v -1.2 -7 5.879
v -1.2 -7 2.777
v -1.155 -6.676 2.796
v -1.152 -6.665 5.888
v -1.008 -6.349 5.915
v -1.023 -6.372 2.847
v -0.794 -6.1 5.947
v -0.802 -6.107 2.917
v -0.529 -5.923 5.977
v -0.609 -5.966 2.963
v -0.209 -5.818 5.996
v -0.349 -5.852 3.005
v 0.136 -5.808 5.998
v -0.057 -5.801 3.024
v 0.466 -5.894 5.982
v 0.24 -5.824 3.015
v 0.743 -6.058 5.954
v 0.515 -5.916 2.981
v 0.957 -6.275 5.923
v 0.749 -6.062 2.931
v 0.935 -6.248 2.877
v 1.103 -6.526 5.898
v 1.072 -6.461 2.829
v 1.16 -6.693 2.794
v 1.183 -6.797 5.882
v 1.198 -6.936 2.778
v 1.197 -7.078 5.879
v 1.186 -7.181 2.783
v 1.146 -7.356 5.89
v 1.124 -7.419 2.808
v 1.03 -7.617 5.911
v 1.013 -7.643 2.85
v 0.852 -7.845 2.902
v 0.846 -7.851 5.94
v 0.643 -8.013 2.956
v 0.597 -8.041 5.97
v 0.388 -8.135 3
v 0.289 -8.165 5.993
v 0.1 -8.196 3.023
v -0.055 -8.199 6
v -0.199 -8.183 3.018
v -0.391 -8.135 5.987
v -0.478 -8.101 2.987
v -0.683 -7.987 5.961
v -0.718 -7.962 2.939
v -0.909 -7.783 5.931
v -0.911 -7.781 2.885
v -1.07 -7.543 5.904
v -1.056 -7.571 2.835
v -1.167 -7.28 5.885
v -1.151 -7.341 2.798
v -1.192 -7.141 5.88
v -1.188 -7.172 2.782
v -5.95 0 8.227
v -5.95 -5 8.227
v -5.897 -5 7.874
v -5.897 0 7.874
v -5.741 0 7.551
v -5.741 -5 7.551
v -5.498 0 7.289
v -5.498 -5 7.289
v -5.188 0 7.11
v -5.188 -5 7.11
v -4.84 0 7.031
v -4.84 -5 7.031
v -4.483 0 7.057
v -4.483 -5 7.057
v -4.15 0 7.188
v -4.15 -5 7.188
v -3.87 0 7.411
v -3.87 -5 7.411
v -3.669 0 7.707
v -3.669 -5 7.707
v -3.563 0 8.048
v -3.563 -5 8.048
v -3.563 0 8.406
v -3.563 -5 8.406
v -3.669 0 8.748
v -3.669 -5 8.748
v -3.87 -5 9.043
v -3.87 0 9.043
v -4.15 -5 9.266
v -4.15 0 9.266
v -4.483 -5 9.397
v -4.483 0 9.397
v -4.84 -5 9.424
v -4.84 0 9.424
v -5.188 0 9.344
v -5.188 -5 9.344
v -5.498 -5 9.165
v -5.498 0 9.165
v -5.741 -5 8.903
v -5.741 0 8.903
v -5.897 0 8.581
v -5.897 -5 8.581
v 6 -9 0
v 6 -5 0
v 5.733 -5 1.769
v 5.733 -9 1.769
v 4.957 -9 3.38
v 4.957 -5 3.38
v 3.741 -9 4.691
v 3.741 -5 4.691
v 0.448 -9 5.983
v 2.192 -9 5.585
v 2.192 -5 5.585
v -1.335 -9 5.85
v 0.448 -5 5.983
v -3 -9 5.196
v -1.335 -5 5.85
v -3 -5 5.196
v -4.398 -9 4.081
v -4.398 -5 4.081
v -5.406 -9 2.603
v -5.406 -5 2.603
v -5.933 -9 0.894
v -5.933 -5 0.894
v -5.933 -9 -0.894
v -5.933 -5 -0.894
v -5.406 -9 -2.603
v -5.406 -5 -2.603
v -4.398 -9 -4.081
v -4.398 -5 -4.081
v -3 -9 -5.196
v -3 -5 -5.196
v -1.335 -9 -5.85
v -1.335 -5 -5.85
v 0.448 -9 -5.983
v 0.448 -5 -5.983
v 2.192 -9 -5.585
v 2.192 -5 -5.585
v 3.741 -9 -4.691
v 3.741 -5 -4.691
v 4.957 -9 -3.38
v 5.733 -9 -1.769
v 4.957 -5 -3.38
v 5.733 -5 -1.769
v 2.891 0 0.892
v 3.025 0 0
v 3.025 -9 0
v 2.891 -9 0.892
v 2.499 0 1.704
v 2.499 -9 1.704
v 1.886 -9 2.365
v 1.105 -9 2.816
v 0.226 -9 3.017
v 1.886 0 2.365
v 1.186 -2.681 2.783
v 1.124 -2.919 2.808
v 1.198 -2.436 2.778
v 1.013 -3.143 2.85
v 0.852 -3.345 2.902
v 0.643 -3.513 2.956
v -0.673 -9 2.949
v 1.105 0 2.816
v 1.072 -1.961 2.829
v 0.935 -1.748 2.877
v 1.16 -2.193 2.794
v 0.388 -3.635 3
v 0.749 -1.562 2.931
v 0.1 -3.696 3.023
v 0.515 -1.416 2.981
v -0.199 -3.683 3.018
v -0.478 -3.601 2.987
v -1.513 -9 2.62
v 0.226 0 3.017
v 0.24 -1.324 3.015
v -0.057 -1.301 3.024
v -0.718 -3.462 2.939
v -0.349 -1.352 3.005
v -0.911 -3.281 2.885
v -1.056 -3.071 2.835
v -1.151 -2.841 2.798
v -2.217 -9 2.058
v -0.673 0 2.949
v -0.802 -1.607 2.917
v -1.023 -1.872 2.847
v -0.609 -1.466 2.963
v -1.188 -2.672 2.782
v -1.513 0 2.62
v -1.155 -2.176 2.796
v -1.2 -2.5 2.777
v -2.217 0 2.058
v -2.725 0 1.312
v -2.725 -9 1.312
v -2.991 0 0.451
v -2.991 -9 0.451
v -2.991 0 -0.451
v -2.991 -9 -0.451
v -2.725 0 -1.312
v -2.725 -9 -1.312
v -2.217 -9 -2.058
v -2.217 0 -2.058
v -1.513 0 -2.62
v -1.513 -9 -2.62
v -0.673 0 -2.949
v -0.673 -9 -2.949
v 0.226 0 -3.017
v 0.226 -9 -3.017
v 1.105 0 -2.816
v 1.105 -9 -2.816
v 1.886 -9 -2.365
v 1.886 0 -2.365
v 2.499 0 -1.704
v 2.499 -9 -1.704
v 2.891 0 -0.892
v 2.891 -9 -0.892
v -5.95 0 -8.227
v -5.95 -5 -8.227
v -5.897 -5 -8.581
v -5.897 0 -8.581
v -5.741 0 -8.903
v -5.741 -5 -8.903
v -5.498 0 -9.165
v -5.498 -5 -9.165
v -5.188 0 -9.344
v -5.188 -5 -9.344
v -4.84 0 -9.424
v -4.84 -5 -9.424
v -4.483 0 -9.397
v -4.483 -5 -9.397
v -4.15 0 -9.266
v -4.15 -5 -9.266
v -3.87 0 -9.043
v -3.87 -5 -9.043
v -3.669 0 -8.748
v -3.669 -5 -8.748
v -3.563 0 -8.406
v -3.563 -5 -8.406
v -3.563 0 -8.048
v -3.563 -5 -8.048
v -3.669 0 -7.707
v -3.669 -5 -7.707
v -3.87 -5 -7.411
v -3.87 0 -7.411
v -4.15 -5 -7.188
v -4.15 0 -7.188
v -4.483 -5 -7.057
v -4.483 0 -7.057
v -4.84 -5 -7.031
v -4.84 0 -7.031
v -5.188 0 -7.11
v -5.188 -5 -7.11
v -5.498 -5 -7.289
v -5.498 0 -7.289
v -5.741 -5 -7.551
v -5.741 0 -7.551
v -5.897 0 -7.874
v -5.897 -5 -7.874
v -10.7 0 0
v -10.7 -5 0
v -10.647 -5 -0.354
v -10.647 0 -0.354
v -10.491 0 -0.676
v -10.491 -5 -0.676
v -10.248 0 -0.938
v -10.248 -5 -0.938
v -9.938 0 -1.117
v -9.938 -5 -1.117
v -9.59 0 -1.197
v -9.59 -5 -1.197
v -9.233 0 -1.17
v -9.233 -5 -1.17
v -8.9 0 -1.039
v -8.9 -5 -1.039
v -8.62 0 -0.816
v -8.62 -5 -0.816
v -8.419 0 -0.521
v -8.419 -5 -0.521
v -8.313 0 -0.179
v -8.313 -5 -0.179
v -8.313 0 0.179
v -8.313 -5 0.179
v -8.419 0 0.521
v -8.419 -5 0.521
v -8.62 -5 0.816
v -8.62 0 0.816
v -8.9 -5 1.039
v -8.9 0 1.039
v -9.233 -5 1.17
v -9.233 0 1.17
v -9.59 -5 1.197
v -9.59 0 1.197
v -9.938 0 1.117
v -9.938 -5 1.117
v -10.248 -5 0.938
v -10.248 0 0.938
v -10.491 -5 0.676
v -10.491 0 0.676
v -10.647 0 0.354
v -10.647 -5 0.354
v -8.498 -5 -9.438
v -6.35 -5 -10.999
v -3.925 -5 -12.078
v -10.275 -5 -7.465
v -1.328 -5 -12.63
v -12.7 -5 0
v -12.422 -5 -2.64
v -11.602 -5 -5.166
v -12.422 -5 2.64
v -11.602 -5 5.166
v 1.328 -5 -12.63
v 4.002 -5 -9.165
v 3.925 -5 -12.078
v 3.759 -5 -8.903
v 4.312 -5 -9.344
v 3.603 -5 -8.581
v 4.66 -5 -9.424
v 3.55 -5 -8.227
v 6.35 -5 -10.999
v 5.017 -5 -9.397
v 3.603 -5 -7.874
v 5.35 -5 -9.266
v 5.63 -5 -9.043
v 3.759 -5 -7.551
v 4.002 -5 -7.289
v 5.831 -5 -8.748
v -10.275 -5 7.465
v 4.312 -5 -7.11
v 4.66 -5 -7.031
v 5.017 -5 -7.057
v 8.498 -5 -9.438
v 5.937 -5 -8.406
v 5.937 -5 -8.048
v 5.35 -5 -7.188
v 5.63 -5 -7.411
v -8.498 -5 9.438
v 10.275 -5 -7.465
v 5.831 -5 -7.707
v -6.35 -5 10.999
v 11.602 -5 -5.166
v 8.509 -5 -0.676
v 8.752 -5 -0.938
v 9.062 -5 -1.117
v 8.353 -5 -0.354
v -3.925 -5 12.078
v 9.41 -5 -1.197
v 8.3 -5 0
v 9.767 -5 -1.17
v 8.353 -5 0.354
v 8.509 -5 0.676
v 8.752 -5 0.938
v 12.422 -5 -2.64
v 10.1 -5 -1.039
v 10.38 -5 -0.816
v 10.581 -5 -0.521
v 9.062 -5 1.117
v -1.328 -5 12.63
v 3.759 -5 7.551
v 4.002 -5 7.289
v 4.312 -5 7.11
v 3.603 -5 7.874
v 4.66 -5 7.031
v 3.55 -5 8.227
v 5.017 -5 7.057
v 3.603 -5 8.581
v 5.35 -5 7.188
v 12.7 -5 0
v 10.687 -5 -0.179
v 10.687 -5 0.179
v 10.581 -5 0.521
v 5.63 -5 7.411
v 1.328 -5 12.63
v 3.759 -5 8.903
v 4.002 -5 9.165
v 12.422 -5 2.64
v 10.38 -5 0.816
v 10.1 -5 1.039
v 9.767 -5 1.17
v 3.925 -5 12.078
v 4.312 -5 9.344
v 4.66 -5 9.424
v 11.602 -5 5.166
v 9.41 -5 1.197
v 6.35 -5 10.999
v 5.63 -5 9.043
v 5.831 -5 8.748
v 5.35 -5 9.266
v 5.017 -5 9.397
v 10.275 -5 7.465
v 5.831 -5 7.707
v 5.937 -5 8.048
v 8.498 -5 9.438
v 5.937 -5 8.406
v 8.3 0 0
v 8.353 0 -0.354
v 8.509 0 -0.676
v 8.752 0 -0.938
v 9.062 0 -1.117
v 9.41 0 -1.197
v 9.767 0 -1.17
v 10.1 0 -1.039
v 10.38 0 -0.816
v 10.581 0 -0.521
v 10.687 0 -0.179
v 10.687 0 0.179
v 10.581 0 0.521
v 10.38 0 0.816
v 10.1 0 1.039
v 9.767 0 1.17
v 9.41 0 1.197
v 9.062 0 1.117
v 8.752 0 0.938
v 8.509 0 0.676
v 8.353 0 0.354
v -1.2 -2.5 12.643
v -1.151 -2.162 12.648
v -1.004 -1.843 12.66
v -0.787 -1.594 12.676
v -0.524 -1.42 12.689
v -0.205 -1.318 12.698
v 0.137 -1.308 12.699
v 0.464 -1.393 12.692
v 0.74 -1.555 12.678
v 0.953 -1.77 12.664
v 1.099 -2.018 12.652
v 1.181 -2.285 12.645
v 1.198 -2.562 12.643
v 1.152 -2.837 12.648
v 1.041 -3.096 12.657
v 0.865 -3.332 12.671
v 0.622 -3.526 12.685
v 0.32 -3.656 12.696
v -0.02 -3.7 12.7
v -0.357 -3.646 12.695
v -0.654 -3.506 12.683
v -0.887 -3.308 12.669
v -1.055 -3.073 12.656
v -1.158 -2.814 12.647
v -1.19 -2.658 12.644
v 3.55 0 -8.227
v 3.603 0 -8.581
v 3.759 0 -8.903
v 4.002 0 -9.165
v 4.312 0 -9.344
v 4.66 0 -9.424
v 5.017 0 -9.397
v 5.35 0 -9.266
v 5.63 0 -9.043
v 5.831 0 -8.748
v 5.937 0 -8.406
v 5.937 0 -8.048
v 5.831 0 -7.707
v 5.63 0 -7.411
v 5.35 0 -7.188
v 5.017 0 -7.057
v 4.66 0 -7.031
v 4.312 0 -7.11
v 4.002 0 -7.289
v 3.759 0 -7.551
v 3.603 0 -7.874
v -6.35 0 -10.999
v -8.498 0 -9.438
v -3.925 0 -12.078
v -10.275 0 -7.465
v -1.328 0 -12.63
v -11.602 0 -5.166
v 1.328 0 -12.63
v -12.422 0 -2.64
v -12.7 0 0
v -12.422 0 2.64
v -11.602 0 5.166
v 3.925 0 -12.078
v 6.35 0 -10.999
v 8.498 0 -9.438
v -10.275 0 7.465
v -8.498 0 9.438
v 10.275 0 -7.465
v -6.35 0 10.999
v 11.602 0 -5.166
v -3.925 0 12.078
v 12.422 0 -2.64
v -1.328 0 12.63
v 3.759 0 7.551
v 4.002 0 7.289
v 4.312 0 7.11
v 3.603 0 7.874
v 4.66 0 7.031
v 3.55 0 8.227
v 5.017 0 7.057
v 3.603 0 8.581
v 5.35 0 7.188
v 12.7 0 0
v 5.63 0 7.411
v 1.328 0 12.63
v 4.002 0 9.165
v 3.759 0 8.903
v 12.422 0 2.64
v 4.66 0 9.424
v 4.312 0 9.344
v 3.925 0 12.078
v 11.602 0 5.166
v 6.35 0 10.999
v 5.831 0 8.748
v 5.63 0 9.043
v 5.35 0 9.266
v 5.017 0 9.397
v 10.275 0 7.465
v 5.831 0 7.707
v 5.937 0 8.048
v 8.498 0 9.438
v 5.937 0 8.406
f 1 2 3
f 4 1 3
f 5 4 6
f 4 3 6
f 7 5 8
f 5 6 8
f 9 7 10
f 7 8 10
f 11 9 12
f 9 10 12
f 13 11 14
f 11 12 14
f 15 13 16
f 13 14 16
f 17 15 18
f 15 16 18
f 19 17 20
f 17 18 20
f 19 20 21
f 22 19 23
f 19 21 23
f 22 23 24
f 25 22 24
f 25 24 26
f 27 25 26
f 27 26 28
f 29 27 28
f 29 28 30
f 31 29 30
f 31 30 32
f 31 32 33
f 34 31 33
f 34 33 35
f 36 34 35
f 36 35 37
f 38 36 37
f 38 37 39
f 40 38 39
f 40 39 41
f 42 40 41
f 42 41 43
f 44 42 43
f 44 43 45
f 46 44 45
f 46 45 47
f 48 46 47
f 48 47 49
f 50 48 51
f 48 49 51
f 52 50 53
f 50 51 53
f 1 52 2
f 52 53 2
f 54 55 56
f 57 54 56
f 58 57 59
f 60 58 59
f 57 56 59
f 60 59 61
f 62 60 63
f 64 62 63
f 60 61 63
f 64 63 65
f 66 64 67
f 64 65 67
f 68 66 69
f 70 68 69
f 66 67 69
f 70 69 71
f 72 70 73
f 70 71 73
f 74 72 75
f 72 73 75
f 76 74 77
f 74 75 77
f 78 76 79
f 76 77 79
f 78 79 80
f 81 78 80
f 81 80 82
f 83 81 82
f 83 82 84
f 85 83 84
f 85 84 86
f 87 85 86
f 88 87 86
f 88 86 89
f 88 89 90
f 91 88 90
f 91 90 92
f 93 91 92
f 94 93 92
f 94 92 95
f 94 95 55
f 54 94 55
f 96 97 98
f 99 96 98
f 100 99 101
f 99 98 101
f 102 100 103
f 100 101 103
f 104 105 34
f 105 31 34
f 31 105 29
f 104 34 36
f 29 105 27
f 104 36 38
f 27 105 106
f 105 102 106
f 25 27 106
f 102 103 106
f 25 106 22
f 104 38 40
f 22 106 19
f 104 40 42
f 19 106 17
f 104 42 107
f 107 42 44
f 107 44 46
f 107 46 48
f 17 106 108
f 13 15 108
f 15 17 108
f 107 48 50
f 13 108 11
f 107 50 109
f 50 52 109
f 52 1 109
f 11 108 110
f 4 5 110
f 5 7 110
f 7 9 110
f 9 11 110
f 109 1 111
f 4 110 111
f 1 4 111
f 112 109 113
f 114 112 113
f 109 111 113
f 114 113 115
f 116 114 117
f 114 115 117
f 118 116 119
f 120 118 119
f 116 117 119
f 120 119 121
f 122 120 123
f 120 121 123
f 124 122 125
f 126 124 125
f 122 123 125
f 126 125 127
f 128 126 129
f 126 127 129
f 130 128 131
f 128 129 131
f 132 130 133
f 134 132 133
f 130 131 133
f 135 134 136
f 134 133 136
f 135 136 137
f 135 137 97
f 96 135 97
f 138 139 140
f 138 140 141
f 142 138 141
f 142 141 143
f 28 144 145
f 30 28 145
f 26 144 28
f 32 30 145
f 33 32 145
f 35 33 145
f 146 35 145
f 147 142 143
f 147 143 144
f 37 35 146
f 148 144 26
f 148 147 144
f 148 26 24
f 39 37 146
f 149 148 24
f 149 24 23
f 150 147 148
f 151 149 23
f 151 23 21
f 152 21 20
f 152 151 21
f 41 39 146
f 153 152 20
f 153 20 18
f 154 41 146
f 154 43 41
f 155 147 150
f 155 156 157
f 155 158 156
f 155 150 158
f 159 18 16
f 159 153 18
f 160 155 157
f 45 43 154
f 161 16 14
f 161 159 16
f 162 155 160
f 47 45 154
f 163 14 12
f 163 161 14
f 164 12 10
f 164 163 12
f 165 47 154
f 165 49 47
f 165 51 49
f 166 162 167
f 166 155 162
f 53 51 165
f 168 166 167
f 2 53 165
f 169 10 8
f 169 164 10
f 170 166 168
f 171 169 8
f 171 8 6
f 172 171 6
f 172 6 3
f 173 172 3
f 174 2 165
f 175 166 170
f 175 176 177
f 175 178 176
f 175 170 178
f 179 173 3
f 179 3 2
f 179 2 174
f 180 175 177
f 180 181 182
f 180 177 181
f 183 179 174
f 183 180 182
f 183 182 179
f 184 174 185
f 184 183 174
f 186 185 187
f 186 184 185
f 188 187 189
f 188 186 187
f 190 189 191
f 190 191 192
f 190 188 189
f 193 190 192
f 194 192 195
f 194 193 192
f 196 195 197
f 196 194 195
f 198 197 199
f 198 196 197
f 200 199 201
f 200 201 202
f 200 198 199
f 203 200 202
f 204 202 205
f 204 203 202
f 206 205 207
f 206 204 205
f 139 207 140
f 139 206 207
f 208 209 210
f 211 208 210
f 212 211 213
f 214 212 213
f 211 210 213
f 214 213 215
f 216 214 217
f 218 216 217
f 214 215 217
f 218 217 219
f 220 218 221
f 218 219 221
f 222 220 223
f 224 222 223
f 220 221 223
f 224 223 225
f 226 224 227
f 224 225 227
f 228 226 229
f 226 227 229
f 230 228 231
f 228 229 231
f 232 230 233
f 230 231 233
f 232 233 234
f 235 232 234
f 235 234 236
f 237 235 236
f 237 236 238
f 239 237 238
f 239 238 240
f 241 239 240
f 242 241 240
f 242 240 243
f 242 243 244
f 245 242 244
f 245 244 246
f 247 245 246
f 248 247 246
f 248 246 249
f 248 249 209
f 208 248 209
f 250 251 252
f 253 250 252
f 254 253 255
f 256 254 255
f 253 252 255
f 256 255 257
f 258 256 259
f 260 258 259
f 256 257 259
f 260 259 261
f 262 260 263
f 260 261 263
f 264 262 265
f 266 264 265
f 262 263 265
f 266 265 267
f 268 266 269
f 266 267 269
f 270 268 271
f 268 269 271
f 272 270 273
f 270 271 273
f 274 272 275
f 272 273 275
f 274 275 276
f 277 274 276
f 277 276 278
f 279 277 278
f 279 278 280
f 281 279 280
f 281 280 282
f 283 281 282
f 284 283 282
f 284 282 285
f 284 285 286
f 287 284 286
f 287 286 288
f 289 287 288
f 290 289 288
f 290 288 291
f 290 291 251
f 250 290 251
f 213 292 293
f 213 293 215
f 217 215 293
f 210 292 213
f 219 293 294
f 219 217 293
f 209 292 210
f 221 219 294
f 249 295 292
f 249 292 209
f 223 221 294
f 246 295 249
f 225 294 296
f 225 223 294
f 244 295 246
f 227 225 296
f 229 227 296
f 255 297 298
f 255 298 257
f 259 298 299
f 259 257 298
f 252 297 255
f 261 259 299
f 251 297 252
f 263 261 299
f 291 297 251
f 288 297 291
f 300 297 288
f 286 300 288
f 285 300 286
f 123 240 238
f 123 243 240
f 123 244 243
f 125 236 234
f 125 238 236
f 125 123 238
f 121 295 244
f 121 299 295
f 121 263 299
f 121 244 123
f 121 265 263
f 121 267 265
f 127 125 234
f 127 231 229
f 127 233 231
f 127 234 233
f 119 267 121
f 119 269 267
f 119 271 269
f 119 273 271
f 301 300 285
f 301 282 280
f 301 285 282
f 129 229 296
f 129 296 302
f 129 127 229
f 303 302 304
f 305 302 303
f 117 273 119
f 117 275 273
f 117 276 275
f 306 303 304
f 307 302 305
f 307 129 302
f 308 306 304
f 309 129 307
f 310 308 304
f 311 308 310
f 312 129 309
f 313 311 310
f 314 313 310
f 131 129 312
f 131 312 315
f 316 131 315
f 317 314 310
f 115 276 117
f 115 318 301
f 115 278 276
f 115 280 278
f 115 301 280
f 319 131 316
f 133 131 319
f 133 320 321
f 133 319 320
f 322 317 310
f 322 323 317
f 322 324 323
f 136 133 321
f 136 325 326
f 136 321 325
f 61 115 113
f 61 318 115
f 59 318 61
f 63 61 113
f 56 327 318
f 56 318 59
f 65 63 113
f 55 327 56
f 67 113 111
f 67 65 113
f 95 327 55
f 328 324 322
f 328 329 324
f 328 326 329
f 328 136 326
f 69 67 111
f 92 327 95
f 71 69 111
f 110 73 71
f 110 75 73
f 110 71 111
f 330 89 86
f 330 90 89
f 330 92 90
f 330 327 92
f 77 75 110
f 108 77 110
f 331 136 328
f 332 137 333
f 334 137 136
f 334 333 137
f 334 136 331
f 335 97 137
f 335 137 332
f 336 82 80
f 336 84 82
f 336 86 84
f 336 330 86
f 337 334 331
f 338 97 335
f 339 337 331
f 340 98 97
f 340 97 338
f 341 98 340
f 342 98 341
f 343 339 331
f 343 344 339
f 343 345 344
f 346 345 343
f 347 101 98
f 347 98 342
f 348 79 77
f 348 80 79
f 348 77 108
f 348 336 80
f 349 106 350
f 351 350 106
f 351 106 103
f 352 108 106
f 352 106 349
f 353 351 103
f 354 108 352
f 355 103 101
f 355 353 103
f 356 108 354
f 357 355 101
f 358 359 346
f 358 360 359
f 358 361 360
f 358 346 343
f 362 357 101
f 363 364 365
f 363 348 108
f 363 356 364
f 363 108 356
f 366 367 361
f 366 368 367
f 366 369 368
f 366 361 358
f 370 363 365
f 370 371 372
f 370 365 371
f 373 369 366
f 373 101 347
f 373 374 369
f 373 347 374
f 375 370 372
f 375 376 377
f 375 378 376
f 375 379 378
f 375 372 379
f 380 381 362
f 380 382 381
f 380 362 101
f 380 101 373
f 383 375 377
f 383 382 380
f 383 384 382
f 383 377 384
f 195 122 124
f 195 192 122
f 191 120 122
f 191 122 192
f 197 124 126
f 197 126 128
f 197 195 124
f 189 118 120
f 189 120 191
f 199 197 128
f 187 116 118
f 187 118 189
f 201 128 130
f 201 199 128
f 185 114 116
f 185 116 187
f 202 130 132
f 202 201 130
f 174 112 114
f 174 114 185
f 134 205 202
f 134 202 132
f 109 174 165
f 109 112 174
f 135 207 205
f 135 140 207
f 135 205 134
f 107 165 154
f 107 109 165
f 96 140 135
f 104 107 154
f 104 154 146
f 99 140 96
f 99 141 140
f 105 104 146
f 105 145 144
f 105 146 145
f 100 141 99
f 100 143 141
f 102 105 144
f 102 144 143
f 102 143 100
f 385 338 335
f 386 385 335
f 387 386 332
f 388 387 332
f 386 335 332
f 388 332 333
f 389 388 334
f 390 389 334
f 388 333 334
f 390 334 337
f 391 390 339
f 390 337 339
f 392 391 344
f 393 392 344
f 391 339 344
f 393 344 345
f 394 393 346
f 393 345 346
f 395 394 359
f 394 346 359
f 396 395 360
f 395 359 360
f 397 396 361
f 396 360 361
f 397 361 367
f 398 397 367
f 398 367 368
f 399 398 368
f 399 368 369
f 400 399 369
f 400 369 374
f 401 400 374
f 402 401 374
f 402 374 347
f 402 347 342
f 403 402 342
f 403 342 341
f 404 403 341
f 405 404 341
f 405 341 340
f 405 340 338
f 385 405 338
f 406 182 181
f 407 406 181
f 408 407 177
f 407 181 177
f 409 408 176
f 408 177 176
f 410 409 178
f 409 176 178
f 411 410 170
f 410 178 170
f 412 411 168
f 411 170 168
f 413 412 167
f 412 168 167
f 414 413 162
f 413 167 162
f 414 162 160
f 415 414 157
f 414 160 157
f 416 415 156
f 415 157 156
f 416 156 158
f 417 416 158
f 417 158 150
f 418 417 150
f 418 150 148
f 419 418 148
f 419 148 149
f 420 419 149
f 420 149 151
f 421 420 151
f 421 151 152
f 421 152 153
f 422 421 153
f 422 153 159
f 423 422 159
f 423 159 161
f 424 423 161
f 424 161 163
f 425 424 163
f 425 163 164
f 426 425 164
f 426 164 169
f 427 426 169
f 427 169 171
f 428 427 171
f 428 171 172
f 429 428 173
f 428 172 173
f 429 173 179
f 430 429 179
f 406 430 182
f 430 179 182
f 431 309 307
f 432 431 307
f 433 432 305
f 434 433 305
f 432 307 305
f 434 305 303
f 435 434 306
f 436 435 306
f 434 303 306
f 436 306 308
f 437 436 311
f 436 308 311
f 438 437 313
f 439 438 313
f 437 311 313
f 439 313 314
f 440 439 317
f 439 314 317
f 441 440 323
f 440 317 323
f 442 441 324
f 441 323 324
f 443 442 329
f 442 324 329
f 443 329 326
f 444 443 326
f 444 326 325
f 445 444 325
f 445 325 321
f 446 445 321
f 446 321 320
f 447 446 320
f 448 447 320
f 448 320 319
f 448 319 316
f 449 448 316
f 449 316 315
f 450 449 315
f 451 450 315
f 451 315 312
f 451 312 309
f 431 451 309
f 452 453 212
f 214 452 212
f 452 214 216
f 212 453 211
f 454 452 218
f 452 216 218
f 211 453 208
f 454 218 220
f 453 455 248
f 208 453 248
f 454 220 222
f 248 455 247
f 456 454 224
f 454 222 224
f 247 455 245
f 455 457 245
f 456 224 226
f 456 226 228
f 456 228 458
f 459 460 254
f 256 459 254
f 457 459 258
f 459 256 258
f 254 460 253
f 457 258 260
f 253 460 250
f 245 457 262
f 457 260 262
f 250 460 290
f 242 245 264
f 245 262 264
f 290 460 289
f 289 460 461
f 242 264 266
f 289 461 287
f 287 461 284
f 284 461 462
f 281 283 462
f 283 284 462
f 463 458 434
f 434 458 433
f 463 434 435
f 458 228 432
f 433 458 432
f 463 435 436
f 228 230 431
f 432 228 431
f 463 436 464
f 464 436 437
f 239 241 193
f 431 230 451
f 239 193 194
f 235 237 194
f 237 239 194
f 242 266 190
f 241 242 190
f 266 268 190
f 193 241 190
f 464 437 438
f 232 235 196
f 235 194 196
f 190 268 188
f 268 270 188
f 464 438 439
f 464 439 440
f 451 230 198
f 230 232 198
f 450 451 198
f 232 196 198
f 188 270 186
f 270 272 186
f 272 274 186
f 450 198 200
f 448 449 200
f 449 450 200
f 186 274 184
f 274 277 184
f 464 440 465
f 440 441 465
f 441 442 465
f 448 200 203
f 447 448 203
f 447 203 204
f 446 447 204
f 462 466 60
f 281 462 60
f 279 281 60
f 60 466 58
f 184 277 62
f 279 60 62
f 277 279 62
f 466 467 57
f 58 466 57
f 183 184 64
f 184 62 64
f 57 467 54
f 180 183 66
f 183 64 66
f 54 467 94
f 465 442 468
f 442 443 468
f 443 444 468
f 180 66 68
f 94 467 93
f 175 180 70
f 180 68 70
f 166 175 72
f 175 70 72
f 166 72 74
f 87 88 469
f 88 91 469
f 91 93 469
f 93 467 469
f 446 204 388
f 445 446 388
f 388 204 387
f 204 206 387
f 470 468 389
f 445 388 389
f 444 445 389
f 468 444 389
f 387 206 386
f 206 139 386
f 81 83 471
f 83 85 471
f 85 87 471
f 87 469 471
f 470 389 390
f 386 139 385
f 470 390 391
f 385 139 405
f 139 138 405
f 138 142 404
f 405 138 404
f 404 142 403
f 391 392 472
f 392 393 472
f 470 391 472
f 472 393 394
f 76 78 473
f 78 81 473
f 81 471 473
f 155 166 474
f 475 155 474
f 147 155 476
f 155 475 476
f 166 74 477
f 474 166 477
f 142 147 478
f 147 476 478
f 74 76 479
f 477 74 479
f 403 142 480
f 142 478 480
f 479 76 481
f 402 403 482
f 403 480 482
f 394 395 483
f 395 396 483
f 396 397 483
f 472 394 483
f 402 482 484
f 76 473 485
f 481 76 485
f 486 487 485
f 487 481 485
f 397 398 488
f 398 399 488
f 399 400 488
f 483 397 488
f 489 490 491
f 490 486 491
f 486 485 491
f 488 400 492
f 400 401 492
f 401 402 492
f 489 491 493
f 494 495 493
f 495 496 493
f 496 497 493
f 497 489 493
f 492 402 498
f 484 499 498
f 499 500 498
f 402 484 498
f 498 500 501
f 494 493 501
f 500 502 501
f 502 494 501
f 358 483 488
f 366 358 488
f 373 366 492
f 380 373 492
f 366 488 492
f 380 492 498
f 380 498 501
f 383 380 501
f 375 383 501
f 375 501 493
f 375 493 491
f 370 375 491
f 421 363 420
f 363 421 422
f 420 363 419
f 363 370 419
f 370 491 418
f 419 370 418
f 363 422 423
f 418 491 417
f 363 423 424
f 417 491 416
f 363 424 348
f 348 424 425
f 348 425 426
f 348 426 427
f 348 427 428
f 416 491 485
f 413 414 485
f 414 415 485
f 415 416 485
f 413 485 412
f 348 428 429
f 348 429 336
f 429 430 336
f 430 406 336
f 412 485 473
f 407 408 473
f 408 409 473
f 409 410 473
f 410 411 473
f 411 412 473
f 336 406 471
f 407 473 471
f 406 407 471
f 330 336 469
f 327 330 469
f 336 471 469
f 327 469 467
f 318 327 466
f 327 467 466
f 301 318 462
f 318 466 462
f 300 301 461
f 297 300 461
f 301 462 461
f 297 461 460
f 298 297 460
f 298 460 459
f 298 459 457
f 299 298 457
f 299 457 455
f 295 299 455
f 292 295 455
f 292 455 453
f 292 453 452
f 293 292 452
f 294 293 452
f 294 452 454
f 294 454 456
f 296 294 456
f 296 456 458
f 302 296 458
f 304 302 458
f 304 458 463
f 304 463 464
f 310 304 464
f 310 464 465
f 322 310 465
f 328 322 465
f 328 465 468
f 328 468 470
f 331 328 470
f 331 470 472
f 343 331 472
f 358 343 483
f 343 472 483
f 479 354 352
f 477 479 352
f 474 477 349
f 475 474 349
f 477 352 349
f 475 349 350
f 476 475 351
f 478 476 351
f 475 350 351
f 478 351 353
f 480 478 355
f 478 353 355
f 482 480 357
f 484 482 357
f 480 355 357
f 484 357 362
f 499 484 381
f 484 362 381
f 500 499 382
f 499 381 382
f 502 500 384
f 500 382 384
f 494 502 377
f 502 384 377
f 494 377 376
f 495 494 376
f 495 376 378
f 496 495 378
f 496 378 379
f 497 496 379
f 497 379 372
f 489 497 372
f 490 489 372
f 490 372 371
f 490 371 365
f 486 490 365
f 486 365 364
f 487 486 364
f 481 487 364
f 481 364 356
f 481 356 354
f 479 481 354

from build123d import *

# Parameters (mm, degrees)
F0_R     = 12.7
F0_R_2   = 6
F0_R_3   = 3.025
F1_DEPTH = 5
F2_DEPTH = 9
F3_D     = 2.4
F6_D     = 2.4
F6_DEPTH = 10
F6_TIP   = 0.7210327428


with BuildPart() as f1:
    # F0 (on Front) → F1 (new body)
    with BuildSketch(Plane.XZ):
        Circle(F0_R)
        Circle(F0_R_2, mode=Mode.SUBTRACT)
        Circle(F0_R_2)
        Circle(F0_R_3, mode=Mode.SUBTRACT)
    extrude(amount=F1_DEPTH)

    # F0 (on Front) → F2 (join)
    with BuildSketch(Plane.XZ):
        Circle(F0_R_2)
        Circle(F0_R_3, mode=Mode.SUBTRACT)
    extrude(amount=F2_DEPTH)

    # F3 (through all)
    with Locations(Plane(origin=(0, 0, 0), x_dir=(1, 0, 0), z_dir=(0, 1, 0))):
        with Locations((9.5, 0), (4.75, -8.227241336), (-4.75, -8.227241336), (-9.5, 0), (-4.75, 8.227241336), (4.75, 8.227241336)):
            Hole(F3_D / 2)

    # F6
    with Locations(Plane.XY.offset(12.7)):
        with Locations((0, -2.5), (0, -7)):
            Hole(F6_D / 2, depth=F6_DEPTH)
            with Locations((0, 0, -(F6_DEPTH + F6_TIP / 2))):  # 118° drill point
                Cone(0, F6_D / 2, F6_TIP, mode=Mode.SUBTRACT)


solid = f1.part
